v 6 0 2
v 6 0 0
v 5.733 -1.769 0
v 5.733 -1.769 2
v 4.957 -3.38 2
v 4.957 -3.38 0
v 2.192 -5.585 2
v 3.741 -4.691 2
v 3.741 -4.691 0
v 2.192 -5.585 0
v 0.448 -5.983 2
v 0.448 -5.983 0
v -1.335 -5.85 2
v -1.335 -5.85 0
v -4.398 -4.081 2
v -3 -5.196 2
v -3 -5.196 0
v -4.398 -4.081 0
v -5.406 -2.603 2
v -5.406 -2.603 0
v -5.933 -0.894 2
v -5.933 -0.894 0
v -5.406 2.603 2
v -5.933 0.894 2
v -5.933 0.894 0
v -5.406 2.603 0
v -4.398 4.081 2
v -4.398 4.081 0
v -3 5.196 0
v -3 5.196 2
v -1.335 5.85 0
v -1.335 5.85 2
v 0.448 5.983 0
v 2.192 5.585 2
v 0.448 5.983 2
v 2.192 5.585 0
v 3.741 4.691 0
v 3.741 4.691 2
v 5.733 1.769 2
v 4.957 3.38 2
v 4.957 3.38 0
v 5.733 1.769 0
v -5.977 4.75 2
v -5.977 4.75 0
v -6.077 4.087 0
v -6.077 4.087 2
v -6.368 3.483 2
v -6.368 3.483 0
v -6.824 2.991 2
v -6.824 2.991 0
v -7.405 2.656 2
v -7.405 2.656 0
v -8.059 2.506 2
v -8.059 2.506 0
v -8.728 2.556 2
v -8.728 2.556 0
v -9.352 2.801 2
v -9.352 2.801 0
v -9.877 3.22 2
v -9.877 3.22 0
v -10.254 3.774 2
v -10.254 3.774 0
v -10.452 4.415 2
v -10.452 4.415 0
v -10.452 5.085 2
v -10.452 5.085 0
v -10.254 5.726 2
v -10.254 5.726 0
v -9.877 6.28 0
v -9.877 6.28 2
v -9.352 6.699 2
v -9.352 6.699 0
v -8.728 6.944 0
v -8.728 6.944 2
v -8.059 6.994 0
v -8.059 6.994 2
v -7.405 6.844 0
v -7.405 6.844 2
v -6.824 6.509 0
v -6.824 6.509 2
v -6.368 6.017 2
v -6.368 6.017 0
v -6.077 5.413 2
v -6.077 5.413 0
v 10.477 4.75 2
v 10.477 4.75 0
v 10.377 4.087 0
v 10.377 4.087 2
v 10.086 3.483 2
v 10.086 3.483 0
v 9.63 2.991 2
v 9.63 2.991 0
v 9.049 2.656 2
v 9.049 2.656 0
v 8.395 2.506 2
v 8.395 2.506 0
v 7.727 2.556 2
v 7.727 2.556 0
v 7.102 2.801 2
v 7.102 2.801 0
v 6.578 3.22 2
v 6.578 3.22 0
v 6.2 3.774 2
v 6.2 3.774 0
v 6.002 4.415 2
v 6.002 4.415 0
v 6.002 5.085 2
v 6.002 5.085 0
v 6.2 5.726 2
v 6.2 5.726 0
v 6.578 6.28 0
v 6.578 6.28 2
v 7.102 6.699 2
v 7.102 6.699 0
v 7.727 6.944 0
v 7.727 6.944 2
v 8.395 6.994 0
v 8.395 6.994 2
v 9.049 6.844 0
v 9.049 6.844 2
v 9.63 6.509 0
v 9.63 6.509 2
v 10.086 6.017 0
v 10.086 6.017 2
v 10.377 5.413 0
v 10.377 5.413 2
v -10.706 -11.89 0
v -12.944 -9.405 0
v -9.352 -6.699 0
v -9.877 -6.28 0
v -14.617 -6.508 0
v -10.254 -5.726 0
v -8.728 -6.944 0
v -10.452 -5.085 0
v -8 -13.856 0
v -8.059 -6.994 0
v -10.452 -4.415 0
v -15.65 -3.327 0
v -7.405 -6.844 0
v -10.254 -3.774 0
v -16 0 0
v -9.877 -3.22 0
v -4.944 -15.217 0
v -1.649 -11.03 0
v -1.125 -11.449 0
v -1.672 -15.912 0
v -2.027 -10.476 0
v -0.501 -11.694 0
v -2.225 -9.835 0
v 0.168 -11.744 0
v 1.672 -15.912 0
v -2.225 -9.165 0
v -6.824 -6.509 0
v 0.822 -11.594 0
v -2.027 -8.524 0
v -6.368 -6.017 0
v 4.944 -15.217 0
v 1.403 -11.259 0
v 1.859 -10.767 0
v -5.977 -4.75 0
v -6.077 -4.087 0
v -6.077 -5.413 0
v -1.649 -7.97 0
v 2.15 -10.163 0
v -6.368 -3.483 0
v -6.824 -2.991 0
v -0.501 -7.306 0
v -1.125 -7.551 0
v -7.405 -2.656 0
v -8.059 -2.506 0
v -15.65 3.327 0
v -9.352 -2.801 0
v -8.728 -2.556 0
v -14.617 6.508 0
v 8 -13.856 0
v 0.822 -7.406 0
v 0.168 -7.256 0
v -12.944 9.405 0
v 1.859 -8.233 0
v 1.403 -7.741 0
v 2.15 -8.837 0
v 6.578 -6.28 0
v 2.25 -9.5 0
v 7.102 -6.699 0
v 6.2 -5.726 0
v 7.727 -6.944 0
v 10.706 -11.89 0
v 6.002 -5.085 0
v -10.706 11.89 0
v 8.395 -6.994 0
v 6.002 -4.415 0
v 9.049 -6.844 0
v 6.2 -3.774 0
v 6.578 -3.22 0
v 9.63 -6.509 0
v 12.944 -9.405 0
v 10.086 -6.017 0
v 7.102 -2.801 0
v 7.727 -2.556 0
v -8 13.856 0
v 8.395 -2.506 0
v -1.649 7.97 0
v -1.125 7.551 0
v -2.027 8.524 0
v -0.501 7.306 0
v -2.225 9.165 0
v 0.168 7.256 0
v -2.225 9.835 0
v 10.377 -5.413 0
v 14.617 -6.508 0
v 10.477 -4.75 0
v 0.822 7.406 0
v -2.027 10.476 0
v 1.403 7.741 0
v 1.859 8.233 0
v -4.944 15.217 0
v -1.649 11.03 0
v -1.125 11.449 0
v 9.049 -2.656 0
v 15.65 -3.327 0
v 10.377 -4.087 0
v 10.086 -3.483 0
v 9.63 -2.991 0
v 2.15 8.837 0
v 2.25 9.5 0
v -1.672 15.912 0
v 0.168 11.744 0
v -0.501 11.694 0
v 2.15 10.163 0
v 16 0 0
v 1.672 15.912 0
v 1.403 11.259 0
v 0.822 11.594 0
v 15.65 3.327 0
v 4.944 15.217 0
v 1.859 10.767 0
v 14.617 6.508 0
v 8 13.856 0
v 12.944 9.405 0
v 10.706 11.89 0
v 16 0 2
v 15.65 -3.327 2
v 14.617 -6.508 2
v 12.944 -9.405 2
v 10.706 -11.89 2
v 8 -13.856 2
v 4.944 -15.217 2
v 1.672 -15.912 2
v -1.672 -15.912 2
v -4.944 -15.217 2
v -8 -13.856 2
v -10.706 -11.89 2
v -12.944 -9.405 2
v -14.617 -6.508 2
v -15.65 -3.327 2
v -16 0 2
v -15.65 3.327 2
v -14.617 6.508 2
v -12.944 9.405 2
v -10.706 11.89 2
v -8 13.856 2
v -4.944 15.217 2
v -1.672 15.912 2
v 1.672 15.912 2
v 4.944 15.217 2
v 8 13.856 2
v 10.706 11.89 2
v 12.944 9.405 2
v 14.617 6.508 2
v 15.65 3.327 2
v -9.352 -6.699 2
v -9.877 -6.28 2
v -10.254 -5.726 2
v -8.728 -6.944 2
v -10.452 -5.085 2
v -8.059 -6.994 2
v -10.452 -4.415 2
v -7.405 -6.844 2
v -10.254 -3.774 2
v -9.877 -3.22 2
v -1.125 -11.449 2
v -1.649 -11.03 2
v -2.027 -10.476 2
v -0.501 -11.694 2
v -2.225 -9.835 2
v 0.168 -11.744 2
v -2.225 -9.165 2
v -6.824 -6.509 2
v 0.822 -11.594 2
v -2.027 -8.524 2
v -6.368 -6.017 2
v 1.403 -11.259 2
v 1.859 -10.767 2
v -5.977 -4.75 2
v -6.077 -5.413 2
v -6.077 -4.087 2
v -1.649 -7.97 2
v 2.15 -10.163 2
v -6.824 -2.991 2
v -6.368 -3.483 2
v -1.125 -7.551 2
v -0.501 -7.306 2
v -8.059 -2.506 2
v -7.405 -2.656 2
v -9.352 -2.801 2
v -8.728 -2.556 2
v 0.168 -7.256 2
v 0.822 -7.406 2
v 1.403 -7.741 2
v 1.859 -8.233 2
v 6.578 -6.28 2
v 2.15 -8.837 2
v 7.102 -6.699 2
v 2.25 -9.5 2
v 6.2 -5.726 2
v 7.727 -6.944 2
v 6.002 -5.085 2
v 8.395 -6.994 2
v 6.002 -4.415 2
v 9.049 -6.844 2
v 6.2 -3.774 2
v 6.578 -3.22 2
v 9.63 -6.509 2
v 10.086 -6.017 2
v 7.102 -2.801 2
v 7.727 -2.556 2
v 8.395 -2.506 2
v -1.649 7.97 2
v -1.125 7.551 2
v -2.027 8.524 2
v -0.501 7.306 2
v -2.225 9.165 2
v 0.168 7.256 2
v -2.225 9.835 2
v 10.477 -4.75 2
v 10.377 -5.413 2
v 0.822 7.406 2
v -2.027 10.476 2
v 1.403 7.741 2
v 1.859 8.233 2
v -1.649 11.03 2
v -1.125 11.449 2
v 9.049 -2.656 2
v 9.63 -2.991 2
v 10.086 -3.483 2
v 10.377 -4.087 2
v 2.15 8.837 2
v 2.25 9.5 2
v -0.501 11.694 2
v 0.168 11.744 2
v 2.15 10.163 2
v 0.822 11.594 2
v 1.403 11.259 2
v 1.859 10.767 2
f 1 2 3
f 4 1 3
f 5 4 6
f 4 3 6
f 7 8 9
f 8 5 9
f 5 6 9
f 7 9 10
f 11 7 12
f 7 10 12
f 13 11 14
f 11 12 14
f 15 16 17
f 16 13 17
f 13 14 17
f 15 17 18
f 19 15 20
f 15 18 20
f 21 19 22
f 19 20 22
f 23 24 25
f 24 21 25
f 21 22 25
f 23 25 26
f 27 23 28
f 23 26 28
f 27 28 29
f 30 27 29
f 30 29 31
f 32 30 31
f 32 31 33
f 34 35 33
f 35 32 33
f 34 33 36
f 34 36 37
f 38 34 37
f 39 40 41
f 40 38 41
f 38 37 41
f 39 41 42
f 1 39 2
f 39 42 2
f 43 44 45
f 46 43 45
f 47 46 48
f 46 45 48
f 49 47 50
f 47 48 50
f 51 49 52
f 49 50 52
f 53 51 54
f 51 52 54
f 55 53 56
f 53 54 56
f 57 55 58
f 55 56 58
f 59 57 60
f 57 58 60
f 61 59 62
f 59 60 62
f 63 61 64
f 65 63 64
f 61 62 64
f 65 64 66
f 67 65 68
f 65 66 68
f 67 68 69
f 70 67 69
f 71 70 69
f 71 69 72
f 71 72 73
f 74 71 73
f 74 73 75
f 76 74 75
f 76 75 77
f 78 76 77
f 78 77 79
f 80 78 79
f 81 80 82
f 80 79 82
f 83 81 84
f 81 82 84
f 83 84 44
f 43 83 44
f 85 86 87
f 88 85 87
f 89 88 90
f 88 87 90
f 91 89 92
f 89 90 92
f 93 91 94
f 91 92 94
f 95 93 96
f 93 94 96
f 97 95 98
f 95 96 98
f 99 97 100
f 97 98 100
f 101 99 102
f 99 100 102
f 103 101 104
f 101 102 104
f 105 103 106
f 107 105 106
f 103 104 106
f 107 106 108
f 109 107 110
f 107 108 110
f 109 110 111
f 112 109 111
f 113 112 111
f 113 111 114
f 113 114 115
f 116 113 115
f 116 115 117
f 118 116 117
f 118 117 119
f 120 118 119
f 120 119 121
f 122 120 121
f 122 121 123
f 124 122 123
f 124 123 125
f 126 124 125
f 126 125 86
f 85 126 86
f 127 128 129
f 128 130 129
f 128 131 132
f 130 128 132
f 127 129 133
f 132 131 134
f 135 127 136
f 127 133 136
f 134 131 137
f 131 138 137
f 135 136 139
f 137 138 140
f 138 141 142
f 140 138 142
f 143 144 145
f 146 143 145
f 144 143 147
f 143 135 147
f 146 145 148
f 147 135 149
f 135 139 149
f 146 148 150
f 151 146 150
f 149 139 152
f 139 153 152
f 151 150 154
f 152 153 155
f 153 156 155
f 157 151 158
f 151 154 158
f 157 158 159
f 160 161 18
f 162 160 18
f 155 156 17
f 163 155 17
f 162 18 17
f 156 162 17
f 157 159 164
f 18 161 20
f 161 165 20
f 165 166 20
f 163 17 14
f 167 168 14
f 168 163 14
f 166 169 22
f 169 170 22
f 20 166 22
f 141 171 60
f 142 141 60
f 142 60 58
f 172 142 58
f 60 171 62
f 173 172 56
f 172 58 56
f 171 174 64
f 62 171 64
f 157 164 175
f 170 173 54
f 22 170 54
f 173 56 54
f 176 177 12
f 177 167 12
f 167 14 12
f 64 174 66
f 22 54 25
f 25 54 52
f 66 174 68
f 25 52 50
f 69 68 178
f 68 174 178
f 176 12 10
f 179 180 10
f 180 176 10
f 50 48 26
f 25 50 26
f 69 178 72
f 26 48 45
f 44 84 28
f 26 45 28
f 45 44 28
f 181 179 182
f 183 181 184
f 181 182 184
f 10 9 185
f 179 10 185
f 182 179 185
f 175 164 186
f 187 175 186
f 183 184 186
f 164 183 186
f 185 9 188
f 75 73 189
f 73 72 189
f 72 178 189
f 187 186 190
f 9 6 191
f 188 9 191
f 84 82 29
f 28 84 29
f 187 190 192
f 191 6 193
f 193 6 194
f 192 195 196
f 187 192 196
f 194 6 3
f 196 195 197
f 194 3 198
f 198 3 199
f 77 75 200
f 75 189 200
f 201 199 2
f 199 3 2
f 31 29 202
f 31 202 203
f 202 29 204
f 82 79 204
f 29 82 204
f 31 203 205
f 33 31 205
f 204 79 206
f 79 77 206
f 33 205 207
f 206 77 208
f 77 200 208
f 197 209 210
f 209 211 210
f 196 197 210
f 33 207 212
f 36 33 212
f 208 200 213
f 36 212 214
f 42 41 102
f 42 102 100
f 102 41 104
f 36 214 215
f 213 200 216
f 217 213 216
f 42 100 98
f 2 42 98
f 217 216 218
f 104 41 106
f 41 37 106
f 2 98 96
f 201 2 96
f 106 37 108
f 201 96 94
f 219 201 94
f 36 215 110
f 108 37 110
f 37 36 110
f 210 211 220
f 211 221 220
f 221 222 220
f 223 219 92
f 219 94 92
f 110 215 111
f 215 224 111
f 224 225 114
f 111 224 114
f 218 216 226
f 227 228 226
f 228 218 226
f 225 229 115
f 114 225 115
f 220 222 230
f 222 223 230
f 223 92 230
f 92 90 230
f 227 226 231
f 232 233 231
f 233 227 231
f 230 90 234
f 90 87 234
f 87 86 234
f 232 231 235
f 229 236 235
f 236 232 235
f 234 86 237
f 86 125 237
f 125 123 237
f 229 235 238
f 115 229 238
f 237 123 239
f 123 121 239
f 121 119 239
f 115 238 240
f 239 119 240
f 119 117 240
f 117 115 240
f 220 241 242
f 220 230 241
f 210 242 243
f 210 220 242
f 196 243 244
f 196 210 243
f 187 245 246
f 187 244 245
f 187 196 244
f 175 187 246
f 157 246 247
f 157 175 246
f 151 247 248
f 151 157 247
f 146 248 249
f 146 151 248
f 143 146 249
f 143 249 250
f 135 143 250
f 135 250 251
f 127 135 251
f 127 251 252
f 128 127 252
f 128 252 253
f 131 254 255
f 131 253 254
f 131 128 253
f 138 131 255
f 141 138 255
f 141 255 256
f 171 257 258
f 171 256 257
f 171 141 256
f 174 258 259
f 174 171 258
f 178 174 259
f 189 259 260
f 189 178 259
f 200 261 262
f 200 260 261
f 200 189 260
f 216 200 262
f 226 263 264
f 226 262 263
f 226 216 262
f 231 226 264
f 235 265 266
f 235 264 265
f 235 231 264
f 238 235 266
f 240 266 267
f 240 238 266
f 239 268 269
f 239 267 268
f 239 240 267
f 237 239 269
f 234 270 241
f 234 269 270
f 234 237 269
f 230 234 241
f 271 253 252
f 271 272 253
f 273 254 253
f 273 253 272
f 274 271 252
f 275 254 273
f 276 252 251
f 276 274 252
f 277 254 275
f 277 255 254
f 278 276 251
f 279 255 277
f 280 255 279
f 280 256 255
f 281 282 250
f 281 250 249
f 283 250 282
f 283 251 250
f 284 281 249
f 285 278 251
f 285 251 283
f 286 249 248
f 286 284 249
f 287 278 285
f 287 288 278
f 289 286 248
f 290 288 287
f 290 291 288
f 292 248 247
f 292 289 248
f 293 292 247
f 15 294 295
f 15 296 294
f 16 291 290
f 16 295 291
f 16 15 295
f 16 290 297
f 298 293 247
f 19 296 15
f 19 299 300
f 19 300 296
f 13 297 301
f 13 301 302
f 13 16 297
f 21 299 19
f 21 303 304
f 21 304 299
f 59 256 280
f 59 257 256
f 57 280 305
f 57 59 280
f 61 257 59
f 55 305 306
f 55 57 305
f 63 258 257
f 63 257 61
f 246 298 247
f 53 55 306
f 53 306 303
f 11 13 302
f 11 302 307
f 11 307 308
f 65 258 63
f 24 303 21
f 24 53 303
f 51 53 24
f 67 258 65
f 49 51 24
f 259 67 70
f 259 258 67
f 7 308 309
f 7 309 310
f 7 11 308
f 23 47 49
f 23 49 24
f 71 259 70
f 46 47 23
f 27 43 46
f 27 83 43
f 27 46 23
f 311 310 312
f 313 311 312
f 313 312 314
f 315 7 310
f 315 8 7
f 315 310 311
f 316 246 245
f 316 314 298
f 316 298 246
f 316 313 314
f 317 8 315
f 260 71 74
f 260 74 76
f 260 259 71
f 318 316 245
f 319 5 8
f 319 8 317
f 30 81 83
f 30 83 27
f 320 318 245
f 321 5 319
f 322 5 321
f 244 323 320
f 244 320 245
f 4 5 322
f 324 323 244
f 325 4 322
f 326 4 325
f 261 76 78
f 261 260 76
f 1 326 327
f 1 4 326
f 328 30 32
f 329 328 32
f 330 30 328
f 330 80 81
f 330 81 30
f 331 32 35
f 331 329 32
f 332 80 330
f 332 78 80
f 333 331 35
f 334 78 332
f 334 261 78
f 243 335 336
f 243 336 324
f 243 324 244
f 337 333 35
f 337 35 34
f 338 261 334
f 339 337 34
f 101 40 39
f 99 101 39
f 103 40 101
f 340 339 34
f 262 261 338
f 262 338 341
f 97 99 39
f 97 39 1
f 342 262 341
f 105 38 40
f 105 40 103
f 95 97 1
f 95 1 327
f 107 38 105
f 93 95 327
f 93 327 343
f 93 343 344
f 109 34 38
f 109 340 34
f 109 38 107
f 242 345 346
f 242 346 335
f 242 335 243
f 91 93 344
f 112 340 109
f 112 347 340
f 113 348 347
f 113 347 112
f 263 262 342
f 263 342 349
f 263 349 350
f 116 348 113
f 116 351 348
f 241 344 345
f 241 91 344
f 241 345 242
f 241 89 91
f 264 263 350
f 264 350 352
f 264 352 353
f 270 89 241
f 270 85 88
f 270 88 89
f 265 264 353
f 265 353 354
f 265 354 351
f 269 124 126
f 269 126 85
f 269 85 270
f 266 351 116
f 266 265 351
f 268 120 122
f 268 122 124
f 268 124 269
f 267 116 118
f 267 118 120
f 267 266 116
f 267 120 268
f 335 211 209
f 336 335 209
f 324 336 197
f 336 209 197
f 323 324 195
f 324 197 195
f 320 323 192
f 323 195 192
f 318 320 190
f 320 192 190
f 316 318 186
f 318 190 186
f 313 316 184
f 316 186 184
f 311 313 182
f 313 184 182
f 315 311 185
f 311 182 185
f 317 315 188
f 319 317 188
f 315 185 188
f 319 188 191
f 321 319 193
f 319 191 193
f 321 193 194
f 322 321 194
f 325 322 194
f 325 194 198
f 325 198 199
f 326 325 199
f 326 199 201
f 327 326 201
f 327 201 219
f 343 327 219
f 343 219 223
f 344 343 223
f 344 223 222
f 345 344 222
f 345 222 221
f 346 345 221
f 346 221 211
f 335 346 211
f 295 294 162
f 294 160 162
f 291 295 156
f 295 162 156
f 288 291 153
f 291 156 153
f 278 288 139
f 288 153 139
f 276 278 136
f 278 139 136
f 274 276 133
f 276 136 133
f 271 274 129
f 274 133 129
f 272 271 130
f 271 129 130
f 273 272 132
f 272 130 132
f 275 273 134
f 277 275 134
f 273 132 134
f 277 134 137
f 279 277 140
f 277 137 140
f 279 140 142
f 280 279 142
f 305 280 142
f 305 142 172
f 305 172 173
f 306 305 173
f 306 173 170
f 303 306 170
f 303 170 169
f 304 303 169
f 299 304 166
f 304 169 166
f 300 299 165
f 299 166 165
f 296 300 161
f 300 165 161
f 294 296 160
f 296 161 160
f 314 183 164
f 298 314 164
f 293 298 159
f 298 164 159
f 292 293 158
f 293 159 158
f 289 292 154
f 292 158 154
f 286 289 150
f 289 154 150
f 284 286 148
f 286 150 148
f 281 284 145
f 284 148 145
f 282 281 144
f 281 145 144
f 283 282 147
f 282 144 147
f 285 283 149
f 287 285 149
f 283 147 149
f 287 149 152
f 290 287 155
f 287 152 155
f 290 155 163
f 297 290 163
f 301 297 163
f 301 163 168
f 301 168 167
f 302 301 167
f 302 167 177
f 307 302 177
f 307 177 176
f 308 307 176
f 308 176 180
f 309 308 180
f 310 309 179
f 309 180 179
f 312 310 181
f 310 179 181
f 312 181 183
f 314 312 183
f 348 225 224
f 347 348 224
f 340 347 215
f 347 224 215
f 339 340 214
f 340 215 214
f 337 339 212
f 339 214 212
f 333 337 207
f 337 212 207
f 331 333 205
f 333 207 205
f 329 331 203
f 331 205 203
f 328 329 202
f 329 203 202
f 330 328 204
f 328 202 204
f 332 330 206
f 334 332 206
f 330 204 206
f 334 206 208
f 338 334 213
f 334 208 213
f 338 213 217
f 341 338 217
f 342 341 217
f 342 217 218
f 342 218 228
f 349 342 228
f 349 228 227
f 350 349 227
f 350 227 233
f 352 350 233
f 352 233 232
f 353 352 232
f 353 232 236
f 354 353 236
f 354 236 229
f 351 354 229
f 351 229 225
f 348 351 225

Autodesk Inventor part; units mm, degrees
ref_plane "YZ Plane" through (0, 0, 0) normal (1, 0, 0) x (0, 1, 0)
ref_plane "XZ Plane" through (0, 0, 0) normal (0, 1, 0) x (-1, 0, 0)
ref_plane "XY Plane" through (0, 0, 0) normal (0, 0, 1) x (1, 0, 0)
sketch "Sketch1" plane through (0, 0, 0) normal (0, 0, 1) x (1, 0, 0)
  circle A0 centre (0, 0) radius 16
  circle A1 centre (0, 0) radius 9.5
  circle A2 centre (0, 9.5) radius 2.25
  circle A3 centre (-8.2272, 4.75) radius 2.25
  circle A4 centre (-8.2272, -4.75) radius 2.25
  circle A5 centre (0, -9.5) radius 2.25
  circle A6 centre (8.2272, -4.75) radius 2.25
  circle A7 centre (8.2272, 4.75) radius 2.25
  circle A8 centre (0, 0) radius 6
  dimension "d1" = 19
  dimension "d0" = 32
  dimension "d2" = 4.5
  dimension "d5" = 360
  dimension "d7" = 12
extrude "Extrusion1" add sketch "Sketch1" along normal blind 2 contours A0 | A1 A6 A5 A4 A3 A2 A7
properties part number "rotor_hub_retainer"
